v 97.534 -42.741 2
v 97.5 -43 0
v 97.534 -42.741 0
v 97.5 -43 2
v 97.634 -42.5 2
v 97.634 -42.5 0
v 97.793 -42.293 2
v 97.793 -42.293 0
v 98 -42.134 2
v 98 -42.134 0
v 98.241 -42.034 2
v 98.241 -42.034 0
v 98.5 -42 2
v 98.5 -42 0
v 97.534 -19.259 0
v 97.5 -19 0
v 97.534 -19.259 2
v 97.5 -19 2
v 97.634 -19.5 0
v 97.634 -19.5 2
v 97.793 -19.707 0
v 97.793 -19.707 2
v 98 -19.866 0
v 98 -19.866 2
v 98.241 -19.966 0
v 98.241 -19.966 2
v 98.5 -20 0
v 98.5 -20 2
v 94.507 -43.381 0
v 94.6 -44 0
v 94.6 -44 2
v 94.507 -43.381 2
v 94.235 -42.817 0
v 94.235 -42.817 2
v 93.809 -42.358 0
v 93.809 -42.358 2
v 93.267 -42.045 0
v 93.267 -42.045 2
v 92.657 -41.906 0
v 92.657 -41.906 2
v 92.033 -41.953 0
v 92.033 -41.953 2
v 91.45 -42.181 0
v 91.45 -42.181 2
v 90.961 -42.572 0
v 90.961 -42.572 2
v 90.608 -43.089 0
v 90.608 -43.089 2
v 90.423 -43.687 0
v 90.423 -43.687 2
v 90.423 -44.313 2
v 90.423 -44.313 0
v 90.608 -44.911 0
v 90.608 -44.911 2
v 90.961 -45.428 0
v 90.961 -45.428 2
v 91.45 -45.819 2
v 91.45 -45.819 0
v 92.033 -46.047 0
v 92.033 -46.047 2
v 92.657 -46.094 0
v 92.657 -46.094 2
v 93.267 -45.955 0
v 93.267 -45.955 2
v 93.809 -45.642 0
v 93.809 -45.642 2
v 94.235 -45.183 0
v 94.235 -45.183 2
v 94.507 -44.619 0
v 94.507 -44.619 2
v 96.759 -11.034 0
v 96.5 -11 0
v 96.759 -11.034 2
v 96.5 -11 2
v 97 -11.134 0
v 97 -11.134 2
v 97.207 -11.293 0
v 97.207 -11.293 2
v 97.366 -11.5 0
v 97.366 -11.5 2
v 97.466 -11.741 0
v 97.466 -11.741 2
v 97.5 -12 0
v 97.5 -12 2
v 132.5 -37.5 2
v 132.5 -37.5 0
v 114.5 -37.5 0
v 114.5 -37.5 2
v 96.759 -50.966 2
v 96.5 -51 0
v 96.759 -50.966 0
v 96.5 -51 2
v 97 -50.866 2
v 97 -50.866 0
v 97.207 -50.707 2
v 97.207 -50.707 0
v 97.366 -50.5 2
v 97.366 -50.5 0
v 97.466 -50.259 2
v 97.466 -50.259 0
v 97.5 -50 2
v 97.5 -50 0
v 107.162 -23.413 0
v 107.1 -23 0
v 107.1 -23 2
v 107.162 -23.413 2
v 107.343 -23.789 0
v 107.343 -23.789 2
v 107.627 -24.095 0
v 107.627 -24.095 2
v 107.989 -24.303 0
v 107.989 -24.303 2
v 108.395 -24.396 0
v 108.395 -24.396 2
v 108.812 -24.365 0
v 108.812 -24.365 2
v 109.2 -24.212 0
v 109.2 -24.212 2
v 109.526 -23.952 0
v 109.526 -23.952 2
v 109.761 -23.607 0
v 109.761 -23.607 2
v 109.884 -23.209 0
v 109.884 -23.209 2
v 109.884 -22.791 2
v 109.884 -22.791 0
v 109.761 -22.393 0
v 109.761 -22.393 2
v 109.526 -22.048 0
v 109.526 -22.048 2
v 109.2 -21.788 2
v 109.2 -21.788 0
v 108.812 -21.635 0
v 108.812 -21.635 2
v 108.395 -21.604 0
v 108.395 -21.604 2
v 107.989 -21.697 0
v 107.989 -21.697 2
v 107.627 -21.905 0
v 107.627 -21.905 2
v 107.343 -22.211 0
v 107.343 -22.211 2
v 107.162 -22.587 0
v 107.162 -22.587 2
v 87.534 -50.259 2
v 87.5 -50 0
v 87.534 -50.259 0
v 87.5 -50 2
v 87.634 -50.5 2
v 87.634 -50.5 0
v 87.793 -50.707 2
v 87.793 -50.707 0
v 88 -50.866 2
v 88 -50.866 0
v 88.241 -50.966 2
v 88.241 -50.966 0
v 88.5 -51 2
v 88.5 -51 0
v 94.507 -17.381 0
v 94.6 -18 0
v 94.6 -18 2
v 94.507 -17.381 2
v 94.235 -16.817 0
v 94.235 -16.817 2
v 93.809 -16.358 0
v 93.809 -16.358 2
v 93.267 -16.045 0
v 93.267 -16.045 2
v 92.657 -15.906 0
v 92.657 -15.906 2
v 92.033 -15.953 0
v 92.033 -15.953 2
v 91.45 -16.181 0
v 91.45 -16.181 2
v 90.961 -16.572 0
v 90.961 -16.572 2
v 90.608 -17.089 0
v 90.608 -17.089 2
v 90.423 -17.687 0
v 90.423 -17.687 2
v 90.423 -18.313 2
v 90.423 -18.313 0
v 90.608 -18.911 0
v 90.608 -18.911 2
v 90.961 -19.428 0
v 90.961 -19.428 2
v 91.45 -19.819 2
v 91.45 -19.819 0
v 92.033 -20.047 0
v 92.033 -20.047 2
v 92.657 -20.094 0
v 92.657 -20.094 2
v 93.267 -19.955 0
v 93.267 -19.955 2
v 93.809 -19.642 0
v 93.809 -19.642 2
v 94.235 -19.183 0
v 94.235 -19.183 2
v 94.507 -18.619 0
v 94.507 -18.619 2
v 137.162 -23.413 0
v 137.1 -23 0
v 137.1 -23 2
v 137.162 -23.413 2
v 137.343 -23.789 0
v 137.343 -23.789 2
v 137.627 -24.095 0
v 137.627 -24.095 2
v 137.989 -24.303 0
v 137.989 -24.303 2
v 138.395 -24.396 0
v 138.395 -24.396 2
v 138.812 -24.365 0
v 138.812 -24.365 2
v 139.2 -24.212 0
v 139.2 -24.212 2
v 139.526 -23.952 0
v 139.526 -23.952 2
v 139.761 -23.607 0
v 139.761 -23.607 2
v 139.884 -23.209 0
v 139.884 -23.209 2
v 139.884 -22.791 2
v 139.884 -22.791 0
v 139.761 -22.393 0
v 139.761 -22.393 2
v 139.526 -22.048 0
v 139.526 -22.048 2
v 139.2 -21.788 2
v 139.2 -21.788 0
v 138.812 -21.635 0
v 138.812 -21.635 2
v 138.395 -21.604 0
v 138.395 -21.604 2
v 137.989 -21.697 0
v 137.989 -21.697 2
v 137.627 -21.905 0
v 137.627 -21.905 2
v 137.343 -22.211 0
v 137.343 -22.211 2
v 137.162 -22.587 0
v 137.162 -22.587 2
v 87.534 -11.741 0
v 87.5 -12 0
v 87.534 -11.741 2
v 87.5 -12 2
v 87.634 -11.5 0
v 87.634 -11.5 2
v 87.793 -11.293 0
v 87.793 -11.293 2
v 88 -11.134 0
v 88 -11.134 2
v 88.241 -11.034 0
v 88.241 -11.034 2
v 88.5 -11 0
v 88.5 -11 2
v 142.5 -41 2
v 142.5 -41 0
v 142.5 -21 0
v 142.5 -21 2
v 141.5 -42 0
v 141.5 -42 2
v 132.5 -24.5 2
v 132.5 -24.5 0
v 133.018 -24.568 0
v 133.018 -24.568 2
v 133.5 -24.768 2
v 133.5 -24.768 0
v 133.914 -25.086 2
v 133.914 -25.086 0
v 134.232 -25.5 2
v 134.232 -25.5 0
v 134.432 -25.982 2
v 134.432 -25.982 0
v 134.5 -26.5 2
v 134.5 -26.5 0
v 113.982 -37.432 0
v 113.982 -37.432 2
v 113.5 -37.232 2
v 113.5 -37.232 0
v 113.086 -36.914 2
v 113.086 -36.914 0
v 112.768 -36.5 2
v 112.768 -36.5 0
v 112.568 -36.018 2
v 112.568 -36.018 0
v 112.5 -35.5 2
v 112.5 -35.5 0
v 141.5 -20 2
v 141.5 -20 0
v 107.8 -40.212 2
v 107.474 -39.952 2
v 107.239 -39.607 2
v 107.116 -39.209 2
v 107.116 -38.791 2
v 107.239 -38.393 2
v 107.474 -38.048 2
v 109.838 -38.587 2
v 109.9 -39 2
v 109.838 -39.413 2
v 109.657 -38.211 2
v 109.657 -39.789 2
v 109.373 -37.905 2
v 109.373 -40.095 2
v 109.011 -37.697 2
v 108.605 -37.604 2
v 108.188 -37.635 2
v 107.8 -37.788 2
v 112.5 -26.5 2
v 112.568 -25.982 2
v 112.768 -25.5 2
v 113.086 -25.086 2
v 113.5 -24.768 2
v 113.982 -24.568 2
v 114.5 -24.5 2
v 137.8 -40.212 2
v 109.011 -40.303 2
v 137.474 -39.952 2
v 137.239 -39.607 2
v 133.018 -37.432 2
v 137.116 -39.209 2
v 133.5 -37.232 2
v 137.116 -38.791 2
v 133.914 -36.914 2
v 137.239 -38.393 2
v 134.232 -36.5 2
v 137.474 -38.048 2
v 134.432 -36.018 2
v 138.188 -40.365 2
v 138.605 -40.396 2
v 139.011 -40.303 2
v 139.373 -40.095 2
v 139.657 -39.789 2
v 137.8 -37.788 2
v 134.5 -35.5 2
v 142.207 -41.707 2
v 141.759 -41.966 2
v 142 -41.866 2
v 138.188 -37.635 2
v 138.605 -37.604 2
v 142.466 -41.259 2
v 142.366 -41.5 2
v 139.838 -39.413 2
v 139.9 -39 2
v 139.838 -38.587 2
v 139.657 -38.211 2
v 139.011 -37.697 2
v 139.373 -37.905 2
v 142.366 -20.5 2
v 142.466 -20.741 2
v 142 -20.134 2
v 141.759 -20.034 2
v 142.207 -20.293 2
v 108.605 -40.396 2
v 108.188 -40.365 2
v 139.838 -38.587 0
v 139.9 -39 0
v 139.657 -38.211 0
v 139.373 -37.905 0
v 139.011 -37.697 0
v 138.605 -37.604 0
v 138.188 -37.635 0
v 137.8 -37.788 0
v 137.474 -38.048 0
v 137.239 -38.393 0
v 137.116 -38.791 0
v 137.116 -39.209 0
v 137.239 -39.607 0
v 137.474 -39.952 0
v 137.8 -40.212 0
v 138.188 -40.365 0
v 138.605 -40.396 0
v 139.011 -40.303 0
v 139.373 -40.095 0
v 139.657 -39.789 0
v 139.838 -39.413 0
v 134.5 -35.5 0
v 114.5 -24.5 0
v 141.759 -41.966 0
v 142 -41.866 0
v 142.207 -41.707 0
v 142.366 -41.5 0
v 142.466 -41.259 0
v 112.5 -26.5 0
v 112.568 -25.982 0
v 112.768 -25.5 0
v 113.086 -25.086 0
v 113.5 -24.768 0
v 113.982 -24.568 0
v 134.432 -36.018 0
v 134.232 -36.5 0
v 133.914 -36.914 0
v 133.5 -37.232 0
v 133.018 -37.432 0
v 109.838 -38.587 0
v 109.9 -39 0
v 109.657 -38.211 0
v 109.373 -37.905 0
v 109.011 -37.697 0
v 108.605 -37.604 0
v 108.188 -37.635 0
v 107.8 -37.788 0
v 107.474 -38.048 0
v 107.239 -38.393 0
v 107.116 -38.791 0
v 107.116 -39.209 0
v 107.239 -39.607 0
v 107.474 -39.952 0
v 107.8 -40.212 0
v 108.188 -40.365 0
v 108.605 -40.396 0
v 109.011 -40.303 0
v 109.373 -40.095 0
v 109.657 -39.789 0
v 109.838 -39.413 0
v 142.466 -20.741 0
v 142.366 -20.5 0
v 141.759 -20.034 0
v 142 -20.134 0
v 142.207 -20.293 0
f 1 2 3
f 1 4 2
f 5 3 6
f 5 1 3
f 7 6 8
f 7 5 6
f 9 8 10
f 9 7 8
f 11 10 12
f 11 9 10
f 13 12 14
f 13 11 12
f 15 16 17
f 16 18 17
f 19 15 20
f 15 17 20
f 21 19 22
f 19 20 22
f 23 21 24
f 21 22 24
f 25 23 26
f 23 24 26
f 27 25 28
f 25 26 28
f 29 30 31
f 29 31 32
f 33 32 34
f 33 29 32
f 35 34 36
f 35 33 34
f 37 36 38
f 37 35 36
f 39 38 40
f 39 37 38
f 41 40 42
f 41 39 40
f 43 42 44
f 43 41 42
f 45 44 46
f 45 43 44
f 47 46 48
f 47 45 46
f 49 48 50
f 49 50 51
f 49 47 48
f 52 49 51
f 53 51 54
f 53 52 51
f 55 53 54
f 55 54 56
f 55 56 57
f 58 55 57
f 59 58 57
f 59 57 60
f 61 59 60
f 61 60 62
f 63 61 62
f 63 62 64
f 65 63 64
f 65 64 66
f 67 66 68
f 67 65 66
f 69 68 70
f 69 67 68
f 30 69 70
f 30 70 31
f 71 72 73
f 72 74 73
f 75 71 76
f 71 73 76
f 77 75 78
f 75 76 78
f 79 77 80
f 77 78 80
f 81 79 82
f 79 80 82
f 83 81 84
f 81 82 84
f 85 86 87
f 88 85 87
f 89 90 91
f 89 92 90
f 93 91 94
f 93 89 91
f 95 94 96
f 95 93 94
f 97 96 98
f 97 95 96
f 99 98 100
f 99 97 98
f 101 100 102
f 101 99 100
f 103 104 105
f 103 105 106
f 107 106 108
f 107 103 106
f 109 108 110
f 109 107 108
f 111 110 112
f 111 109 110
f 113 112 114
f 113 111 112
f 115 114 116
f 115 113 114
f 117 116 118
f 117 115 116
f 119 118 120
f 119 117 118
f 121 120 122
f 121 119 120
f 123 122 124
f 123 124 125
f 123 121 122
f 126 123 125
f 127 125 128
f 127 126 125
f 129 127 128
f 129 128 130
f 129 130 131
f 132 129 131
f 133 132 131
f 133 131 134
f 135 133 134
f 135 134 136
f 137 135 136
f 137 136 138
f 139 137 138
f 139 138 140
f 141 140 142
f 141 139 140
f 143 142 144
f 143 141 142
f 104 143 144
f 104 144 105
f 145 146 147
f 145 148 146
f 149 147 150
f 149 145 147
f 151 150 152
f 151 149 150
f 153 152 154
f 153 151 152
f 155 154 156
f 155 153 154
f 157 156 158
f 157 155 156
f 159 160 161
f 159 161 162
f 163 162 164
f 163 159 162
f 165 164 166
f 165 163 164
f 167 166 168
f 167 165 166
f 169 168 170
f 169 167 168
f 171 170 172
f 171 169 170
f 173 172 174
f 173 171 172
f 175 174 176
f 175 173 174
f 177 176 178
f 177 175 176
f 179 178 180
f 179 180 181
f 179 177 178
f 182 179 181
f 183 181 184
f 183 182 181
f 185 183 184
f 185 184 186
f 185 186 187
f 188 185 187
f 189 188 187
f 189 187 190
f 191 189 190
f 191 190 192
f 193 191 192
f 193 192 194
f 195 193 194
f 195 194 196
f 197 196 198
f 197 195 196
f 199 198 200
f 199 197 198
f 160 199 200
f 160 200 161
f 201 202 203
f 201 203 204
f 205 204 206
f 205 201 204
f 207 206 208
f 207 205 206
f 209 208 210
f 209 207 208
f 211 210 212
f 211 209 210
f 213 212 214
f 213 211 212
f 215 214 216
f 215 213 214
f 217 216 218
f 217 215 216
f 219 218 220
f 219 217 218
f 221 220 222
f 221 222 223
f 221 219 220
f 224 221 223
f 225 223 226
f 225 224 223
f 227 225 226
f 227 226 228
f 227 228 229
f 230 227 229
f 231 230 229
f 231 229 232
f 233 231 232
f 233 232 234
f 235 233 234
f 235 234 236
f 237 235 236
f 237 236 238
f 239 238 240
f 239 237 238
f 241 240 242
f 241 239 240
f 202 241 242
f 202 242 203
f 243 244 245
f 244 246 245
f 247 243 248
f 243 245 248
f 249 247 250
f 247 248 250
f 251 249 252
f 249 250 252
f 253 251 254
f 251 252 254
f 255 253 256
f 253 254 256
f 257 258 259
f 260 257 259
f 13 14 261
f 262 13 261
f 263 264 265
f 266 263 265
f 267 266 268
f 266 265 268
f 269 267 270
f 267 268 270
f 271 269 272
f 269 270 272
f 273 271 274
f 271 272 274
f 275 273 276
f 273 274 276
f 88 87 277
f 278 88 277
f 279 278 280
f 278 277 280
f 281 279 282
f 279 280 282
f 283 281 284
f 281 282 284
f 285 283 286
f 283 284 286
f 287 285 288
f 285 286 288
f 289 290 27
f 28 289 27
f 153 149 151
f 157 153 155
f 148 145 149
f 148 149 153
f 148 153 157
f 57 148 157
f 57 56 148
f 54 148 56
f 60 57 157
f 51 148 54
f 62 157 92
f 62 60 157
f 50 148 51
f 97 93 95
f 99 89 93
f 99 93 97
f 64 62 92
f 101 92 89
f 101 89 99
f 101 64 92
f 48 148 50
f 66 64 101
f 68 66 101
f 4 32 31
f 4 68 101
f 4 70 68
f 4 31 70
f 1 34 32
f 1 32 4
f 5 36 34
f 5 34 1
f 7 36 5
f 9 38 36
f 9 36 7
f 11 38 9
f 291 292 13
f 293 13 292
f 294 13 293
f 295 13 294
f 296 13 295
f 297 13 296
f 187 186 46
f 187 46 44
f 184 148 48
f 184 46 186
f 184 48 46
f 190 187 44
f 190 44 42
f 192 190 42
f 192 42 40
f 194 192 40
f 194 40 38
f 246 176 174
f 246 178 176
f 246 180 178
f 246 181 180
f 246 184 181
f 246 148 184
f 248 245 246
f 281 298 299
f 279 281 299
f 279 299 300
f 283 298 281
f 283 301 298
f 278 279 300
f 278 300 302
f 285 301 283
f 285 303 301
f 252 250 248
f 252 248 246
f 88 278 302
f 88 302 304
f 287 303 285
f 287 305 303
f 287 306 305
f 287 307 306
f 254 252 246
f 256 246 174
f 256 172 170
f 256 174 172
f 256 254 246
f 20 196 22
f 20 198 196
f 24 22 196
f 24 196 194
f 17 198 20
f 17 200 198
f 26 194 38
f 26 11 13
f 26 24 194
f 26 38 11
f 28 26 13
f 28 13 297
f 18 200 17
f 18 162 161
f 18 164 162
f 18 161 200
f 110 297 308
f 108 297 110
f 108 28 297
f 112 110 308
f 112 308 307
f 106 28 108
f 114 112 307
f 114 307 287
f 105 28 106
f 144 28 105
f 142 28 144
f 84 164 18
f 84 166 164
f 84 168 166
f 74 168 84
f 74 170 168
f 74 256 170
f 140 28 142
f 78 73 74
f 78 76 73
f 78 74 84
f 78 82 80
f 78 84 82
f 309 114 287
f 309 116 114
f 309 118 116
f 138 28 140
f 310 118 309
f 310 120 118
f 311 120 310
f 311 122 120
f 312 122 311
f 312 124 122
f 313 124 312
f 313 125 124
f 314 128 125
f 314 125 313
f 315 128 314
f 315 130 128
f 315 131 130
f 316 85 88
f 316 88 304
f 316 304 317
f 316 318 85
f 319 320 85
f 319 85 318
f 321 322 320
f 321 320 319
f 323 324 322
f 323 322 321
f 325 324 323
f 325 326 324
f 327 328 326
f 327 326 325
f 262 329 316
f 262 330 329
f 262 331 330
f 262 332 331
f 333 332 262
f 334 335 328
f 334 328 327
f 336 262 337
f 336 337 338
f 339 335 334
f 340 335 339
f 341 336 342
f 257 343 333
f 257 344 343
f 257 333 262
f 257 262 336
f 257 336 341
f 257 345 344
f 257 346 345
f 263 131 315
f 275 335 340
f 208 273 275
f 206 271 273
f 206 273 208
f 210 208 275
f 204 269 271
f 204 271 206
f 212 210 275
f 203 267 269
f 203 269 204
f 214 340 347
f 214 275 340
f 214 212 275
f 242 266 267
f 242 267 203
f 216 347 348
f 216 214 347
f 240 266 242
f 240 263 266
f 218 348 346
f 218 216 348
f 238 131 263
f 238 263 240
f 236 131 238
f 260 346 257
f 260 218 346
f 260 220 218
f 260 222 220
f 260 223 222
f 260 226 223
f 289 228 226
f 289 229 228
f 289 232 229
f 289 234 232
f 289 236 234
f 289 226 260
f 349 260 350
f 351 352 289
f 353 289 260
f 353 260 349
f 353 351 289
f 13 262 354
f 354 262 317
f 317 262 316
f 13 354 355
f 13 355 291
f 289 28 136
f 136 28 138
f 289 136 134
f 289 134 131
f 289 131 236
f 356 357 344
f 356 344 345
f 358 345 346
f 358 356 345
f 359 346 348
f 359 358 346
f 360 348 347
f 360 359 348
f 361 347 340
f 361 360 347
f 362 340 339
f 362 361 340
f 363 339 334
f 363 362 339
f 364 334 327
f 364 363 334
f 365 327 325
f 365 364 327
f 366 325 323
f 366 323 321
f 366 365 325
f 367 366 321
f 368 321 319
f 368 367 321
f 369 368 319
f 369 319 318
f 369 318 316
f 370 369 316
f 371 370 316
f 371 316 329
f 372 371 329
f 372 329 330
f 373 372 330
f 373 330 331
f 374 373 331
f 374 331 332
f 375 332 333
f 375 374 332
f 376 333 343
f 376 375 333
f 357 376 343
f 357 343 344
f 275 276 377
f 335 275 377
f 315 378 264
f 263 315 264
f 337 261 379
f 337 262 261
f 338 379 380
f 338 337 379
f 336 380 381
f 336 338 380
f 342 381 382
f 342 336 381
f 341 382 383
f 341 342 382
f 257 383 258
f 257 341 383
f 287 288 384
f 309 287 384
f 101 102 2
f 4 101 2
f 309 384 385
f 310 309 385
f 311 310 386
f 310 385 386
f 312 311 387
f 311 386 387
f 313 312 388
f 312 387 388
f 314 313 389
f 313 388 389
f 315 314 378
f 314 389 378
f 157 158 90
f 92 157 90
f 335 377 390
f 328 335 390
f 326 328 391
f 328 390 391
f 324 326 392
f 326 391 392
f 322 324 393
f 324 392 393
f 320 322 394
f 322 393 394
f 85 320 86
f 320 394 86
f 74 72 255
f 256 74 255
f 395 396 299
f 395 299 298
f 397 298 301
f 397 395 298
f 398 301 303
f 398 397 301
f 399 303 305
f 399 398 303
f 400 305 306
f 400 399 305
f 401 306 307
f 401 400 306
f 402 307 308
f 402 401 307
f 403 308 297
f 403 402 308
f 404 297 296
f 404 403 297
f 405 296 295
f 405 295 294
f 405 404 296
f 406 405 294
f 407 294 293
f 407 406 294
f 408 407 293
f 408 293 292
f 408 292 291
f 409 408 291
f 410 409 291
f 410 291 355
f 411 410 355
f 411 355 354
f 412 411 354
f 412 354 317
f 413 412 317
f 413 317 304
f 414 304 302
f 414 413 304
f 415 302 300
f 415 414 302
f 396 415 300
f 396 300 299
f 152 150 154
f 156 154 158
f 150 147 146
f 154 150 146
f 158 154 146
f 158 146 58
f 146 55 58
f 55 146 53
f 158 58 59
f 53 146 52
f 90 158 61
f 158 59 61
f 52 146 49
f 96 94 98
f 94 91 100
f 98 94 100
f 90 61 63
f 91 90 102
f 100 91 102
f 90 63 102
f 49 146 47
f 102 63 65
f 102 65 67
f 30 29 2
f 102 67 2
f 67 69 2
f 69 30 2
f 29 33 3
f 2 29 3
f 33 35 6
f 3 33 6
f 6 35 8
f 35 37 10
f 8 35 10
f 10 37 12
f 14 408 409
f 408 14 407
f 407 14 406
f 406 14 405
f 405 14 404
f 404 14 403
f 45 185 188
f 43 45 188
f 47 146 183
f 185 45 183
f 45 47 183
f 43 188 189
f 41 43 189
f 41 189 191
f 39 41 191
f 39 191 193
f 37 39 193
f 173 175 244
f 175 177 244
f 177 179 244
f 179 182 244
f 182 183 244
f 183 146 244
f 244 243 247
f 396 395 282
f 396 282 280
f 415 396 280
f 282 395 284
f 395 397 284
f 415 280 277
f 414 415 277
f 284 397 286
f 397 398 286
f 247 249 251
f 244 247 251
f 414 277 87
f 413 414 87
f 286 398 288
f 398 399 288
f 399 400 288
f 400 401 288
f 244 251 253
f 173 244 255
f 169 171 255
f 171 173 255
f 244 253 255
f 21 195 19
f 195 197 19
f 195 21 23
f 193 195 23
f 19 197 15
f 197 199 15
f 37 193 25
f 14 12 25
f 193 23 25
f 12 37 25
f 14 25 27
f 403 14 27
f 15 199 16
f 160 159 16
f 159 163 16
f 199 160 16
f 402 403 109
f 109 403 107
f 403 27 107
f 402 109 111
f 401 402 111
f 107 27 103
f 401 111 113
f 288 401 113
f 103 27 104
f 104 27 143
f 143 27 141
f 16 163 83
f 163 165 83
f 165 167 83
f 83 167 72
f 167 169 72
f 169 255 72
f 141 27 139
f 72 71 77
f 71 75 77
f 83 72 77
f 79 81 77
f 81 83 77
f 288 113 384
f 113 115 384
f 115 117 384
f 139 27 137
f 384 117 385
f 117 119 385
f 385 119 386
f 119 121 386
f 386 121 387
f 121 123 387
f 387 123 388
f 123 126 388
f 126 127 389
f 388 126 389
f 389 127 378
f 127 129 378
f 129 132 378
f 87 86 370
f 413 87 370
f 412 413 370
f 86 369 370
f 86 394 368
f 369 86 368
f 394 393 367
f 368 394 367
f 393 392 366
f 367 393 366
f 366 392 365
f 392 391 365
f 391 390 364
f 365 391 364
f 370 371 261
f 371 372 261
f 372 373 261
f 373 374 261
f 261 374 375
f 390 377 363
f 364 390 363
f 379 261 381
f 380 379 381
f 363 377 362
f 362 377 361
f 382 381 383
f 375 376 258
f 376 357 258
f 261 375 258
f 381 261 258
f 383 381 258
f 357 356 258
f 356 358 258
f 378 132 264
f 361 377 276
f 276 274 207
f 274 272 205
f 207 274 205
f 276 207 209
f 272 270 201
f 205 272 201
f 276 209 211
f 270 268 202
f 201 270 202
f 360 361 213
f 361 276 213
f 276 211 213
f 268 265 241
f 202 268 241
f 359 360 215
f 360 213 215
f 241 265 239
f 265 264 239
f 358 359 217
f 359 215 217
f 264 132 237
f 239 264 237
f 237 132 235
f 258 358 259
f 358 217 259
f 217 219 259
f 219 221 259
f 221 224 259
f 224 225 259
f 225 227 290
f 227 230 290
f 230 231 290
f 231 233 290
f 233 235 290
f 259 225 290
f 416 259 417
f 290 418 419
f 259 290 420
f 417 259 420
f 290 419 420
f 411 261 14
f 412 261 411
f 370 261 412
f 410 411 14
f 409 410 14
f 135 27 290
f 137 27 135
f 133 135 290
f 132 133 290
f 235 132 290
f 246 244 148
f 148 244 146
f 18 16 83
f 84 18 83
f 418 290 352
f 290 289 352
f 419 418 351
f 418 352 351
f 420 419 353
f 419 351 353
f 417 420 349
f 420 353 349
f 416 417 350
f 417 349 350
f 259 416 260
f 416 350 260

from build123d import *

# Parameters (mm, degrees)
SKETCH_1_R      = 2.1
SKETCH_1_R_2    = 1.4
EXTRUDE_1_DEPTH = 2
FILLET_1_R      = 1


with BuildPart() as part:
    # 草图1 → 凸台-拉伸1 (new body)
    with BuildSketch(Plane.XY):
        Polygon((87.5, -11), (87.5, -51), (97.5, -51), (97.5, -42), (142.5, -42), (142.5, -20), (97.5, -20), (97.5, -11), align=None)
        with Locations((92.5, -18)):
            Circle(SKETCH_1_R, mode=Mode.SUBTRACT)
        with Locations((92.5, -44)):
            Circle(SKETCH_1_R, mode=Mode.SUBTRACT)
        with Locations((138.5, -39)):
            Circle(SKETCH_1_R_2, mode=Mode.SUBTRACT)
        with Locations((108.5, -39)):
            Circle(SKETCH_1_R_2, mode=Mode.SUBTRACT)
        with Locations(Location((108.5, -23, 0), (0, 0, 180))):
            Circle(SKETCH_1_R_2, mode=Mode.SUBTRACT)
        with Locations(Location((138.5, -23, 0), (0, 0, 180))):
            Circle(SKETCH_1_R_2, mode=Mode.SUBTRACT)
        with BuildLine():
            Line((132.5, -37.5), (114.5, -37.5))
            ThreePointArc((114.5, -37.5), (113.085786438, -36.914213562), (112.5, -35.5))
            Line((112.5, -35.5), (112.5, -26.5))
            ThreePointArc((112.5, -26.5), (113.085786438, -25.085786438), (114.5, -24.5))
            Line((114.5, -24.5), (132.5, -24.5))
            ThreePointArc((132.5, -24.5), (133.914213562, -25.085786438), (134.5, -26.5))
            Line((134.5, -26.5), (134.5, -35.5))
            ThreePointArc((134.5, -35.5), (133.914213562, -36.914213562), (132.5, -37.5))
        make_face(mode=Mode.SUBTRACT)
    extrude(amount=EXTRUDE_1_DEPTH)

    # 圆角1
    fillet_1_edges = [part.edges().sort_by_distance(p)[0] for p in [
        (97.5, -11, 1),
        (97.5, -20, 1),
        (142.5, -20, 1),
        (142.5, -42, 1),
        (97.5, -42, 1),
        (97.5, -51, 1),
        (87.5, -51, 1),
        (87.5, -11, 1),
    ]]
    fillet(fillet_1_edges, radius=FILLET_1_R)


solid = part.part
